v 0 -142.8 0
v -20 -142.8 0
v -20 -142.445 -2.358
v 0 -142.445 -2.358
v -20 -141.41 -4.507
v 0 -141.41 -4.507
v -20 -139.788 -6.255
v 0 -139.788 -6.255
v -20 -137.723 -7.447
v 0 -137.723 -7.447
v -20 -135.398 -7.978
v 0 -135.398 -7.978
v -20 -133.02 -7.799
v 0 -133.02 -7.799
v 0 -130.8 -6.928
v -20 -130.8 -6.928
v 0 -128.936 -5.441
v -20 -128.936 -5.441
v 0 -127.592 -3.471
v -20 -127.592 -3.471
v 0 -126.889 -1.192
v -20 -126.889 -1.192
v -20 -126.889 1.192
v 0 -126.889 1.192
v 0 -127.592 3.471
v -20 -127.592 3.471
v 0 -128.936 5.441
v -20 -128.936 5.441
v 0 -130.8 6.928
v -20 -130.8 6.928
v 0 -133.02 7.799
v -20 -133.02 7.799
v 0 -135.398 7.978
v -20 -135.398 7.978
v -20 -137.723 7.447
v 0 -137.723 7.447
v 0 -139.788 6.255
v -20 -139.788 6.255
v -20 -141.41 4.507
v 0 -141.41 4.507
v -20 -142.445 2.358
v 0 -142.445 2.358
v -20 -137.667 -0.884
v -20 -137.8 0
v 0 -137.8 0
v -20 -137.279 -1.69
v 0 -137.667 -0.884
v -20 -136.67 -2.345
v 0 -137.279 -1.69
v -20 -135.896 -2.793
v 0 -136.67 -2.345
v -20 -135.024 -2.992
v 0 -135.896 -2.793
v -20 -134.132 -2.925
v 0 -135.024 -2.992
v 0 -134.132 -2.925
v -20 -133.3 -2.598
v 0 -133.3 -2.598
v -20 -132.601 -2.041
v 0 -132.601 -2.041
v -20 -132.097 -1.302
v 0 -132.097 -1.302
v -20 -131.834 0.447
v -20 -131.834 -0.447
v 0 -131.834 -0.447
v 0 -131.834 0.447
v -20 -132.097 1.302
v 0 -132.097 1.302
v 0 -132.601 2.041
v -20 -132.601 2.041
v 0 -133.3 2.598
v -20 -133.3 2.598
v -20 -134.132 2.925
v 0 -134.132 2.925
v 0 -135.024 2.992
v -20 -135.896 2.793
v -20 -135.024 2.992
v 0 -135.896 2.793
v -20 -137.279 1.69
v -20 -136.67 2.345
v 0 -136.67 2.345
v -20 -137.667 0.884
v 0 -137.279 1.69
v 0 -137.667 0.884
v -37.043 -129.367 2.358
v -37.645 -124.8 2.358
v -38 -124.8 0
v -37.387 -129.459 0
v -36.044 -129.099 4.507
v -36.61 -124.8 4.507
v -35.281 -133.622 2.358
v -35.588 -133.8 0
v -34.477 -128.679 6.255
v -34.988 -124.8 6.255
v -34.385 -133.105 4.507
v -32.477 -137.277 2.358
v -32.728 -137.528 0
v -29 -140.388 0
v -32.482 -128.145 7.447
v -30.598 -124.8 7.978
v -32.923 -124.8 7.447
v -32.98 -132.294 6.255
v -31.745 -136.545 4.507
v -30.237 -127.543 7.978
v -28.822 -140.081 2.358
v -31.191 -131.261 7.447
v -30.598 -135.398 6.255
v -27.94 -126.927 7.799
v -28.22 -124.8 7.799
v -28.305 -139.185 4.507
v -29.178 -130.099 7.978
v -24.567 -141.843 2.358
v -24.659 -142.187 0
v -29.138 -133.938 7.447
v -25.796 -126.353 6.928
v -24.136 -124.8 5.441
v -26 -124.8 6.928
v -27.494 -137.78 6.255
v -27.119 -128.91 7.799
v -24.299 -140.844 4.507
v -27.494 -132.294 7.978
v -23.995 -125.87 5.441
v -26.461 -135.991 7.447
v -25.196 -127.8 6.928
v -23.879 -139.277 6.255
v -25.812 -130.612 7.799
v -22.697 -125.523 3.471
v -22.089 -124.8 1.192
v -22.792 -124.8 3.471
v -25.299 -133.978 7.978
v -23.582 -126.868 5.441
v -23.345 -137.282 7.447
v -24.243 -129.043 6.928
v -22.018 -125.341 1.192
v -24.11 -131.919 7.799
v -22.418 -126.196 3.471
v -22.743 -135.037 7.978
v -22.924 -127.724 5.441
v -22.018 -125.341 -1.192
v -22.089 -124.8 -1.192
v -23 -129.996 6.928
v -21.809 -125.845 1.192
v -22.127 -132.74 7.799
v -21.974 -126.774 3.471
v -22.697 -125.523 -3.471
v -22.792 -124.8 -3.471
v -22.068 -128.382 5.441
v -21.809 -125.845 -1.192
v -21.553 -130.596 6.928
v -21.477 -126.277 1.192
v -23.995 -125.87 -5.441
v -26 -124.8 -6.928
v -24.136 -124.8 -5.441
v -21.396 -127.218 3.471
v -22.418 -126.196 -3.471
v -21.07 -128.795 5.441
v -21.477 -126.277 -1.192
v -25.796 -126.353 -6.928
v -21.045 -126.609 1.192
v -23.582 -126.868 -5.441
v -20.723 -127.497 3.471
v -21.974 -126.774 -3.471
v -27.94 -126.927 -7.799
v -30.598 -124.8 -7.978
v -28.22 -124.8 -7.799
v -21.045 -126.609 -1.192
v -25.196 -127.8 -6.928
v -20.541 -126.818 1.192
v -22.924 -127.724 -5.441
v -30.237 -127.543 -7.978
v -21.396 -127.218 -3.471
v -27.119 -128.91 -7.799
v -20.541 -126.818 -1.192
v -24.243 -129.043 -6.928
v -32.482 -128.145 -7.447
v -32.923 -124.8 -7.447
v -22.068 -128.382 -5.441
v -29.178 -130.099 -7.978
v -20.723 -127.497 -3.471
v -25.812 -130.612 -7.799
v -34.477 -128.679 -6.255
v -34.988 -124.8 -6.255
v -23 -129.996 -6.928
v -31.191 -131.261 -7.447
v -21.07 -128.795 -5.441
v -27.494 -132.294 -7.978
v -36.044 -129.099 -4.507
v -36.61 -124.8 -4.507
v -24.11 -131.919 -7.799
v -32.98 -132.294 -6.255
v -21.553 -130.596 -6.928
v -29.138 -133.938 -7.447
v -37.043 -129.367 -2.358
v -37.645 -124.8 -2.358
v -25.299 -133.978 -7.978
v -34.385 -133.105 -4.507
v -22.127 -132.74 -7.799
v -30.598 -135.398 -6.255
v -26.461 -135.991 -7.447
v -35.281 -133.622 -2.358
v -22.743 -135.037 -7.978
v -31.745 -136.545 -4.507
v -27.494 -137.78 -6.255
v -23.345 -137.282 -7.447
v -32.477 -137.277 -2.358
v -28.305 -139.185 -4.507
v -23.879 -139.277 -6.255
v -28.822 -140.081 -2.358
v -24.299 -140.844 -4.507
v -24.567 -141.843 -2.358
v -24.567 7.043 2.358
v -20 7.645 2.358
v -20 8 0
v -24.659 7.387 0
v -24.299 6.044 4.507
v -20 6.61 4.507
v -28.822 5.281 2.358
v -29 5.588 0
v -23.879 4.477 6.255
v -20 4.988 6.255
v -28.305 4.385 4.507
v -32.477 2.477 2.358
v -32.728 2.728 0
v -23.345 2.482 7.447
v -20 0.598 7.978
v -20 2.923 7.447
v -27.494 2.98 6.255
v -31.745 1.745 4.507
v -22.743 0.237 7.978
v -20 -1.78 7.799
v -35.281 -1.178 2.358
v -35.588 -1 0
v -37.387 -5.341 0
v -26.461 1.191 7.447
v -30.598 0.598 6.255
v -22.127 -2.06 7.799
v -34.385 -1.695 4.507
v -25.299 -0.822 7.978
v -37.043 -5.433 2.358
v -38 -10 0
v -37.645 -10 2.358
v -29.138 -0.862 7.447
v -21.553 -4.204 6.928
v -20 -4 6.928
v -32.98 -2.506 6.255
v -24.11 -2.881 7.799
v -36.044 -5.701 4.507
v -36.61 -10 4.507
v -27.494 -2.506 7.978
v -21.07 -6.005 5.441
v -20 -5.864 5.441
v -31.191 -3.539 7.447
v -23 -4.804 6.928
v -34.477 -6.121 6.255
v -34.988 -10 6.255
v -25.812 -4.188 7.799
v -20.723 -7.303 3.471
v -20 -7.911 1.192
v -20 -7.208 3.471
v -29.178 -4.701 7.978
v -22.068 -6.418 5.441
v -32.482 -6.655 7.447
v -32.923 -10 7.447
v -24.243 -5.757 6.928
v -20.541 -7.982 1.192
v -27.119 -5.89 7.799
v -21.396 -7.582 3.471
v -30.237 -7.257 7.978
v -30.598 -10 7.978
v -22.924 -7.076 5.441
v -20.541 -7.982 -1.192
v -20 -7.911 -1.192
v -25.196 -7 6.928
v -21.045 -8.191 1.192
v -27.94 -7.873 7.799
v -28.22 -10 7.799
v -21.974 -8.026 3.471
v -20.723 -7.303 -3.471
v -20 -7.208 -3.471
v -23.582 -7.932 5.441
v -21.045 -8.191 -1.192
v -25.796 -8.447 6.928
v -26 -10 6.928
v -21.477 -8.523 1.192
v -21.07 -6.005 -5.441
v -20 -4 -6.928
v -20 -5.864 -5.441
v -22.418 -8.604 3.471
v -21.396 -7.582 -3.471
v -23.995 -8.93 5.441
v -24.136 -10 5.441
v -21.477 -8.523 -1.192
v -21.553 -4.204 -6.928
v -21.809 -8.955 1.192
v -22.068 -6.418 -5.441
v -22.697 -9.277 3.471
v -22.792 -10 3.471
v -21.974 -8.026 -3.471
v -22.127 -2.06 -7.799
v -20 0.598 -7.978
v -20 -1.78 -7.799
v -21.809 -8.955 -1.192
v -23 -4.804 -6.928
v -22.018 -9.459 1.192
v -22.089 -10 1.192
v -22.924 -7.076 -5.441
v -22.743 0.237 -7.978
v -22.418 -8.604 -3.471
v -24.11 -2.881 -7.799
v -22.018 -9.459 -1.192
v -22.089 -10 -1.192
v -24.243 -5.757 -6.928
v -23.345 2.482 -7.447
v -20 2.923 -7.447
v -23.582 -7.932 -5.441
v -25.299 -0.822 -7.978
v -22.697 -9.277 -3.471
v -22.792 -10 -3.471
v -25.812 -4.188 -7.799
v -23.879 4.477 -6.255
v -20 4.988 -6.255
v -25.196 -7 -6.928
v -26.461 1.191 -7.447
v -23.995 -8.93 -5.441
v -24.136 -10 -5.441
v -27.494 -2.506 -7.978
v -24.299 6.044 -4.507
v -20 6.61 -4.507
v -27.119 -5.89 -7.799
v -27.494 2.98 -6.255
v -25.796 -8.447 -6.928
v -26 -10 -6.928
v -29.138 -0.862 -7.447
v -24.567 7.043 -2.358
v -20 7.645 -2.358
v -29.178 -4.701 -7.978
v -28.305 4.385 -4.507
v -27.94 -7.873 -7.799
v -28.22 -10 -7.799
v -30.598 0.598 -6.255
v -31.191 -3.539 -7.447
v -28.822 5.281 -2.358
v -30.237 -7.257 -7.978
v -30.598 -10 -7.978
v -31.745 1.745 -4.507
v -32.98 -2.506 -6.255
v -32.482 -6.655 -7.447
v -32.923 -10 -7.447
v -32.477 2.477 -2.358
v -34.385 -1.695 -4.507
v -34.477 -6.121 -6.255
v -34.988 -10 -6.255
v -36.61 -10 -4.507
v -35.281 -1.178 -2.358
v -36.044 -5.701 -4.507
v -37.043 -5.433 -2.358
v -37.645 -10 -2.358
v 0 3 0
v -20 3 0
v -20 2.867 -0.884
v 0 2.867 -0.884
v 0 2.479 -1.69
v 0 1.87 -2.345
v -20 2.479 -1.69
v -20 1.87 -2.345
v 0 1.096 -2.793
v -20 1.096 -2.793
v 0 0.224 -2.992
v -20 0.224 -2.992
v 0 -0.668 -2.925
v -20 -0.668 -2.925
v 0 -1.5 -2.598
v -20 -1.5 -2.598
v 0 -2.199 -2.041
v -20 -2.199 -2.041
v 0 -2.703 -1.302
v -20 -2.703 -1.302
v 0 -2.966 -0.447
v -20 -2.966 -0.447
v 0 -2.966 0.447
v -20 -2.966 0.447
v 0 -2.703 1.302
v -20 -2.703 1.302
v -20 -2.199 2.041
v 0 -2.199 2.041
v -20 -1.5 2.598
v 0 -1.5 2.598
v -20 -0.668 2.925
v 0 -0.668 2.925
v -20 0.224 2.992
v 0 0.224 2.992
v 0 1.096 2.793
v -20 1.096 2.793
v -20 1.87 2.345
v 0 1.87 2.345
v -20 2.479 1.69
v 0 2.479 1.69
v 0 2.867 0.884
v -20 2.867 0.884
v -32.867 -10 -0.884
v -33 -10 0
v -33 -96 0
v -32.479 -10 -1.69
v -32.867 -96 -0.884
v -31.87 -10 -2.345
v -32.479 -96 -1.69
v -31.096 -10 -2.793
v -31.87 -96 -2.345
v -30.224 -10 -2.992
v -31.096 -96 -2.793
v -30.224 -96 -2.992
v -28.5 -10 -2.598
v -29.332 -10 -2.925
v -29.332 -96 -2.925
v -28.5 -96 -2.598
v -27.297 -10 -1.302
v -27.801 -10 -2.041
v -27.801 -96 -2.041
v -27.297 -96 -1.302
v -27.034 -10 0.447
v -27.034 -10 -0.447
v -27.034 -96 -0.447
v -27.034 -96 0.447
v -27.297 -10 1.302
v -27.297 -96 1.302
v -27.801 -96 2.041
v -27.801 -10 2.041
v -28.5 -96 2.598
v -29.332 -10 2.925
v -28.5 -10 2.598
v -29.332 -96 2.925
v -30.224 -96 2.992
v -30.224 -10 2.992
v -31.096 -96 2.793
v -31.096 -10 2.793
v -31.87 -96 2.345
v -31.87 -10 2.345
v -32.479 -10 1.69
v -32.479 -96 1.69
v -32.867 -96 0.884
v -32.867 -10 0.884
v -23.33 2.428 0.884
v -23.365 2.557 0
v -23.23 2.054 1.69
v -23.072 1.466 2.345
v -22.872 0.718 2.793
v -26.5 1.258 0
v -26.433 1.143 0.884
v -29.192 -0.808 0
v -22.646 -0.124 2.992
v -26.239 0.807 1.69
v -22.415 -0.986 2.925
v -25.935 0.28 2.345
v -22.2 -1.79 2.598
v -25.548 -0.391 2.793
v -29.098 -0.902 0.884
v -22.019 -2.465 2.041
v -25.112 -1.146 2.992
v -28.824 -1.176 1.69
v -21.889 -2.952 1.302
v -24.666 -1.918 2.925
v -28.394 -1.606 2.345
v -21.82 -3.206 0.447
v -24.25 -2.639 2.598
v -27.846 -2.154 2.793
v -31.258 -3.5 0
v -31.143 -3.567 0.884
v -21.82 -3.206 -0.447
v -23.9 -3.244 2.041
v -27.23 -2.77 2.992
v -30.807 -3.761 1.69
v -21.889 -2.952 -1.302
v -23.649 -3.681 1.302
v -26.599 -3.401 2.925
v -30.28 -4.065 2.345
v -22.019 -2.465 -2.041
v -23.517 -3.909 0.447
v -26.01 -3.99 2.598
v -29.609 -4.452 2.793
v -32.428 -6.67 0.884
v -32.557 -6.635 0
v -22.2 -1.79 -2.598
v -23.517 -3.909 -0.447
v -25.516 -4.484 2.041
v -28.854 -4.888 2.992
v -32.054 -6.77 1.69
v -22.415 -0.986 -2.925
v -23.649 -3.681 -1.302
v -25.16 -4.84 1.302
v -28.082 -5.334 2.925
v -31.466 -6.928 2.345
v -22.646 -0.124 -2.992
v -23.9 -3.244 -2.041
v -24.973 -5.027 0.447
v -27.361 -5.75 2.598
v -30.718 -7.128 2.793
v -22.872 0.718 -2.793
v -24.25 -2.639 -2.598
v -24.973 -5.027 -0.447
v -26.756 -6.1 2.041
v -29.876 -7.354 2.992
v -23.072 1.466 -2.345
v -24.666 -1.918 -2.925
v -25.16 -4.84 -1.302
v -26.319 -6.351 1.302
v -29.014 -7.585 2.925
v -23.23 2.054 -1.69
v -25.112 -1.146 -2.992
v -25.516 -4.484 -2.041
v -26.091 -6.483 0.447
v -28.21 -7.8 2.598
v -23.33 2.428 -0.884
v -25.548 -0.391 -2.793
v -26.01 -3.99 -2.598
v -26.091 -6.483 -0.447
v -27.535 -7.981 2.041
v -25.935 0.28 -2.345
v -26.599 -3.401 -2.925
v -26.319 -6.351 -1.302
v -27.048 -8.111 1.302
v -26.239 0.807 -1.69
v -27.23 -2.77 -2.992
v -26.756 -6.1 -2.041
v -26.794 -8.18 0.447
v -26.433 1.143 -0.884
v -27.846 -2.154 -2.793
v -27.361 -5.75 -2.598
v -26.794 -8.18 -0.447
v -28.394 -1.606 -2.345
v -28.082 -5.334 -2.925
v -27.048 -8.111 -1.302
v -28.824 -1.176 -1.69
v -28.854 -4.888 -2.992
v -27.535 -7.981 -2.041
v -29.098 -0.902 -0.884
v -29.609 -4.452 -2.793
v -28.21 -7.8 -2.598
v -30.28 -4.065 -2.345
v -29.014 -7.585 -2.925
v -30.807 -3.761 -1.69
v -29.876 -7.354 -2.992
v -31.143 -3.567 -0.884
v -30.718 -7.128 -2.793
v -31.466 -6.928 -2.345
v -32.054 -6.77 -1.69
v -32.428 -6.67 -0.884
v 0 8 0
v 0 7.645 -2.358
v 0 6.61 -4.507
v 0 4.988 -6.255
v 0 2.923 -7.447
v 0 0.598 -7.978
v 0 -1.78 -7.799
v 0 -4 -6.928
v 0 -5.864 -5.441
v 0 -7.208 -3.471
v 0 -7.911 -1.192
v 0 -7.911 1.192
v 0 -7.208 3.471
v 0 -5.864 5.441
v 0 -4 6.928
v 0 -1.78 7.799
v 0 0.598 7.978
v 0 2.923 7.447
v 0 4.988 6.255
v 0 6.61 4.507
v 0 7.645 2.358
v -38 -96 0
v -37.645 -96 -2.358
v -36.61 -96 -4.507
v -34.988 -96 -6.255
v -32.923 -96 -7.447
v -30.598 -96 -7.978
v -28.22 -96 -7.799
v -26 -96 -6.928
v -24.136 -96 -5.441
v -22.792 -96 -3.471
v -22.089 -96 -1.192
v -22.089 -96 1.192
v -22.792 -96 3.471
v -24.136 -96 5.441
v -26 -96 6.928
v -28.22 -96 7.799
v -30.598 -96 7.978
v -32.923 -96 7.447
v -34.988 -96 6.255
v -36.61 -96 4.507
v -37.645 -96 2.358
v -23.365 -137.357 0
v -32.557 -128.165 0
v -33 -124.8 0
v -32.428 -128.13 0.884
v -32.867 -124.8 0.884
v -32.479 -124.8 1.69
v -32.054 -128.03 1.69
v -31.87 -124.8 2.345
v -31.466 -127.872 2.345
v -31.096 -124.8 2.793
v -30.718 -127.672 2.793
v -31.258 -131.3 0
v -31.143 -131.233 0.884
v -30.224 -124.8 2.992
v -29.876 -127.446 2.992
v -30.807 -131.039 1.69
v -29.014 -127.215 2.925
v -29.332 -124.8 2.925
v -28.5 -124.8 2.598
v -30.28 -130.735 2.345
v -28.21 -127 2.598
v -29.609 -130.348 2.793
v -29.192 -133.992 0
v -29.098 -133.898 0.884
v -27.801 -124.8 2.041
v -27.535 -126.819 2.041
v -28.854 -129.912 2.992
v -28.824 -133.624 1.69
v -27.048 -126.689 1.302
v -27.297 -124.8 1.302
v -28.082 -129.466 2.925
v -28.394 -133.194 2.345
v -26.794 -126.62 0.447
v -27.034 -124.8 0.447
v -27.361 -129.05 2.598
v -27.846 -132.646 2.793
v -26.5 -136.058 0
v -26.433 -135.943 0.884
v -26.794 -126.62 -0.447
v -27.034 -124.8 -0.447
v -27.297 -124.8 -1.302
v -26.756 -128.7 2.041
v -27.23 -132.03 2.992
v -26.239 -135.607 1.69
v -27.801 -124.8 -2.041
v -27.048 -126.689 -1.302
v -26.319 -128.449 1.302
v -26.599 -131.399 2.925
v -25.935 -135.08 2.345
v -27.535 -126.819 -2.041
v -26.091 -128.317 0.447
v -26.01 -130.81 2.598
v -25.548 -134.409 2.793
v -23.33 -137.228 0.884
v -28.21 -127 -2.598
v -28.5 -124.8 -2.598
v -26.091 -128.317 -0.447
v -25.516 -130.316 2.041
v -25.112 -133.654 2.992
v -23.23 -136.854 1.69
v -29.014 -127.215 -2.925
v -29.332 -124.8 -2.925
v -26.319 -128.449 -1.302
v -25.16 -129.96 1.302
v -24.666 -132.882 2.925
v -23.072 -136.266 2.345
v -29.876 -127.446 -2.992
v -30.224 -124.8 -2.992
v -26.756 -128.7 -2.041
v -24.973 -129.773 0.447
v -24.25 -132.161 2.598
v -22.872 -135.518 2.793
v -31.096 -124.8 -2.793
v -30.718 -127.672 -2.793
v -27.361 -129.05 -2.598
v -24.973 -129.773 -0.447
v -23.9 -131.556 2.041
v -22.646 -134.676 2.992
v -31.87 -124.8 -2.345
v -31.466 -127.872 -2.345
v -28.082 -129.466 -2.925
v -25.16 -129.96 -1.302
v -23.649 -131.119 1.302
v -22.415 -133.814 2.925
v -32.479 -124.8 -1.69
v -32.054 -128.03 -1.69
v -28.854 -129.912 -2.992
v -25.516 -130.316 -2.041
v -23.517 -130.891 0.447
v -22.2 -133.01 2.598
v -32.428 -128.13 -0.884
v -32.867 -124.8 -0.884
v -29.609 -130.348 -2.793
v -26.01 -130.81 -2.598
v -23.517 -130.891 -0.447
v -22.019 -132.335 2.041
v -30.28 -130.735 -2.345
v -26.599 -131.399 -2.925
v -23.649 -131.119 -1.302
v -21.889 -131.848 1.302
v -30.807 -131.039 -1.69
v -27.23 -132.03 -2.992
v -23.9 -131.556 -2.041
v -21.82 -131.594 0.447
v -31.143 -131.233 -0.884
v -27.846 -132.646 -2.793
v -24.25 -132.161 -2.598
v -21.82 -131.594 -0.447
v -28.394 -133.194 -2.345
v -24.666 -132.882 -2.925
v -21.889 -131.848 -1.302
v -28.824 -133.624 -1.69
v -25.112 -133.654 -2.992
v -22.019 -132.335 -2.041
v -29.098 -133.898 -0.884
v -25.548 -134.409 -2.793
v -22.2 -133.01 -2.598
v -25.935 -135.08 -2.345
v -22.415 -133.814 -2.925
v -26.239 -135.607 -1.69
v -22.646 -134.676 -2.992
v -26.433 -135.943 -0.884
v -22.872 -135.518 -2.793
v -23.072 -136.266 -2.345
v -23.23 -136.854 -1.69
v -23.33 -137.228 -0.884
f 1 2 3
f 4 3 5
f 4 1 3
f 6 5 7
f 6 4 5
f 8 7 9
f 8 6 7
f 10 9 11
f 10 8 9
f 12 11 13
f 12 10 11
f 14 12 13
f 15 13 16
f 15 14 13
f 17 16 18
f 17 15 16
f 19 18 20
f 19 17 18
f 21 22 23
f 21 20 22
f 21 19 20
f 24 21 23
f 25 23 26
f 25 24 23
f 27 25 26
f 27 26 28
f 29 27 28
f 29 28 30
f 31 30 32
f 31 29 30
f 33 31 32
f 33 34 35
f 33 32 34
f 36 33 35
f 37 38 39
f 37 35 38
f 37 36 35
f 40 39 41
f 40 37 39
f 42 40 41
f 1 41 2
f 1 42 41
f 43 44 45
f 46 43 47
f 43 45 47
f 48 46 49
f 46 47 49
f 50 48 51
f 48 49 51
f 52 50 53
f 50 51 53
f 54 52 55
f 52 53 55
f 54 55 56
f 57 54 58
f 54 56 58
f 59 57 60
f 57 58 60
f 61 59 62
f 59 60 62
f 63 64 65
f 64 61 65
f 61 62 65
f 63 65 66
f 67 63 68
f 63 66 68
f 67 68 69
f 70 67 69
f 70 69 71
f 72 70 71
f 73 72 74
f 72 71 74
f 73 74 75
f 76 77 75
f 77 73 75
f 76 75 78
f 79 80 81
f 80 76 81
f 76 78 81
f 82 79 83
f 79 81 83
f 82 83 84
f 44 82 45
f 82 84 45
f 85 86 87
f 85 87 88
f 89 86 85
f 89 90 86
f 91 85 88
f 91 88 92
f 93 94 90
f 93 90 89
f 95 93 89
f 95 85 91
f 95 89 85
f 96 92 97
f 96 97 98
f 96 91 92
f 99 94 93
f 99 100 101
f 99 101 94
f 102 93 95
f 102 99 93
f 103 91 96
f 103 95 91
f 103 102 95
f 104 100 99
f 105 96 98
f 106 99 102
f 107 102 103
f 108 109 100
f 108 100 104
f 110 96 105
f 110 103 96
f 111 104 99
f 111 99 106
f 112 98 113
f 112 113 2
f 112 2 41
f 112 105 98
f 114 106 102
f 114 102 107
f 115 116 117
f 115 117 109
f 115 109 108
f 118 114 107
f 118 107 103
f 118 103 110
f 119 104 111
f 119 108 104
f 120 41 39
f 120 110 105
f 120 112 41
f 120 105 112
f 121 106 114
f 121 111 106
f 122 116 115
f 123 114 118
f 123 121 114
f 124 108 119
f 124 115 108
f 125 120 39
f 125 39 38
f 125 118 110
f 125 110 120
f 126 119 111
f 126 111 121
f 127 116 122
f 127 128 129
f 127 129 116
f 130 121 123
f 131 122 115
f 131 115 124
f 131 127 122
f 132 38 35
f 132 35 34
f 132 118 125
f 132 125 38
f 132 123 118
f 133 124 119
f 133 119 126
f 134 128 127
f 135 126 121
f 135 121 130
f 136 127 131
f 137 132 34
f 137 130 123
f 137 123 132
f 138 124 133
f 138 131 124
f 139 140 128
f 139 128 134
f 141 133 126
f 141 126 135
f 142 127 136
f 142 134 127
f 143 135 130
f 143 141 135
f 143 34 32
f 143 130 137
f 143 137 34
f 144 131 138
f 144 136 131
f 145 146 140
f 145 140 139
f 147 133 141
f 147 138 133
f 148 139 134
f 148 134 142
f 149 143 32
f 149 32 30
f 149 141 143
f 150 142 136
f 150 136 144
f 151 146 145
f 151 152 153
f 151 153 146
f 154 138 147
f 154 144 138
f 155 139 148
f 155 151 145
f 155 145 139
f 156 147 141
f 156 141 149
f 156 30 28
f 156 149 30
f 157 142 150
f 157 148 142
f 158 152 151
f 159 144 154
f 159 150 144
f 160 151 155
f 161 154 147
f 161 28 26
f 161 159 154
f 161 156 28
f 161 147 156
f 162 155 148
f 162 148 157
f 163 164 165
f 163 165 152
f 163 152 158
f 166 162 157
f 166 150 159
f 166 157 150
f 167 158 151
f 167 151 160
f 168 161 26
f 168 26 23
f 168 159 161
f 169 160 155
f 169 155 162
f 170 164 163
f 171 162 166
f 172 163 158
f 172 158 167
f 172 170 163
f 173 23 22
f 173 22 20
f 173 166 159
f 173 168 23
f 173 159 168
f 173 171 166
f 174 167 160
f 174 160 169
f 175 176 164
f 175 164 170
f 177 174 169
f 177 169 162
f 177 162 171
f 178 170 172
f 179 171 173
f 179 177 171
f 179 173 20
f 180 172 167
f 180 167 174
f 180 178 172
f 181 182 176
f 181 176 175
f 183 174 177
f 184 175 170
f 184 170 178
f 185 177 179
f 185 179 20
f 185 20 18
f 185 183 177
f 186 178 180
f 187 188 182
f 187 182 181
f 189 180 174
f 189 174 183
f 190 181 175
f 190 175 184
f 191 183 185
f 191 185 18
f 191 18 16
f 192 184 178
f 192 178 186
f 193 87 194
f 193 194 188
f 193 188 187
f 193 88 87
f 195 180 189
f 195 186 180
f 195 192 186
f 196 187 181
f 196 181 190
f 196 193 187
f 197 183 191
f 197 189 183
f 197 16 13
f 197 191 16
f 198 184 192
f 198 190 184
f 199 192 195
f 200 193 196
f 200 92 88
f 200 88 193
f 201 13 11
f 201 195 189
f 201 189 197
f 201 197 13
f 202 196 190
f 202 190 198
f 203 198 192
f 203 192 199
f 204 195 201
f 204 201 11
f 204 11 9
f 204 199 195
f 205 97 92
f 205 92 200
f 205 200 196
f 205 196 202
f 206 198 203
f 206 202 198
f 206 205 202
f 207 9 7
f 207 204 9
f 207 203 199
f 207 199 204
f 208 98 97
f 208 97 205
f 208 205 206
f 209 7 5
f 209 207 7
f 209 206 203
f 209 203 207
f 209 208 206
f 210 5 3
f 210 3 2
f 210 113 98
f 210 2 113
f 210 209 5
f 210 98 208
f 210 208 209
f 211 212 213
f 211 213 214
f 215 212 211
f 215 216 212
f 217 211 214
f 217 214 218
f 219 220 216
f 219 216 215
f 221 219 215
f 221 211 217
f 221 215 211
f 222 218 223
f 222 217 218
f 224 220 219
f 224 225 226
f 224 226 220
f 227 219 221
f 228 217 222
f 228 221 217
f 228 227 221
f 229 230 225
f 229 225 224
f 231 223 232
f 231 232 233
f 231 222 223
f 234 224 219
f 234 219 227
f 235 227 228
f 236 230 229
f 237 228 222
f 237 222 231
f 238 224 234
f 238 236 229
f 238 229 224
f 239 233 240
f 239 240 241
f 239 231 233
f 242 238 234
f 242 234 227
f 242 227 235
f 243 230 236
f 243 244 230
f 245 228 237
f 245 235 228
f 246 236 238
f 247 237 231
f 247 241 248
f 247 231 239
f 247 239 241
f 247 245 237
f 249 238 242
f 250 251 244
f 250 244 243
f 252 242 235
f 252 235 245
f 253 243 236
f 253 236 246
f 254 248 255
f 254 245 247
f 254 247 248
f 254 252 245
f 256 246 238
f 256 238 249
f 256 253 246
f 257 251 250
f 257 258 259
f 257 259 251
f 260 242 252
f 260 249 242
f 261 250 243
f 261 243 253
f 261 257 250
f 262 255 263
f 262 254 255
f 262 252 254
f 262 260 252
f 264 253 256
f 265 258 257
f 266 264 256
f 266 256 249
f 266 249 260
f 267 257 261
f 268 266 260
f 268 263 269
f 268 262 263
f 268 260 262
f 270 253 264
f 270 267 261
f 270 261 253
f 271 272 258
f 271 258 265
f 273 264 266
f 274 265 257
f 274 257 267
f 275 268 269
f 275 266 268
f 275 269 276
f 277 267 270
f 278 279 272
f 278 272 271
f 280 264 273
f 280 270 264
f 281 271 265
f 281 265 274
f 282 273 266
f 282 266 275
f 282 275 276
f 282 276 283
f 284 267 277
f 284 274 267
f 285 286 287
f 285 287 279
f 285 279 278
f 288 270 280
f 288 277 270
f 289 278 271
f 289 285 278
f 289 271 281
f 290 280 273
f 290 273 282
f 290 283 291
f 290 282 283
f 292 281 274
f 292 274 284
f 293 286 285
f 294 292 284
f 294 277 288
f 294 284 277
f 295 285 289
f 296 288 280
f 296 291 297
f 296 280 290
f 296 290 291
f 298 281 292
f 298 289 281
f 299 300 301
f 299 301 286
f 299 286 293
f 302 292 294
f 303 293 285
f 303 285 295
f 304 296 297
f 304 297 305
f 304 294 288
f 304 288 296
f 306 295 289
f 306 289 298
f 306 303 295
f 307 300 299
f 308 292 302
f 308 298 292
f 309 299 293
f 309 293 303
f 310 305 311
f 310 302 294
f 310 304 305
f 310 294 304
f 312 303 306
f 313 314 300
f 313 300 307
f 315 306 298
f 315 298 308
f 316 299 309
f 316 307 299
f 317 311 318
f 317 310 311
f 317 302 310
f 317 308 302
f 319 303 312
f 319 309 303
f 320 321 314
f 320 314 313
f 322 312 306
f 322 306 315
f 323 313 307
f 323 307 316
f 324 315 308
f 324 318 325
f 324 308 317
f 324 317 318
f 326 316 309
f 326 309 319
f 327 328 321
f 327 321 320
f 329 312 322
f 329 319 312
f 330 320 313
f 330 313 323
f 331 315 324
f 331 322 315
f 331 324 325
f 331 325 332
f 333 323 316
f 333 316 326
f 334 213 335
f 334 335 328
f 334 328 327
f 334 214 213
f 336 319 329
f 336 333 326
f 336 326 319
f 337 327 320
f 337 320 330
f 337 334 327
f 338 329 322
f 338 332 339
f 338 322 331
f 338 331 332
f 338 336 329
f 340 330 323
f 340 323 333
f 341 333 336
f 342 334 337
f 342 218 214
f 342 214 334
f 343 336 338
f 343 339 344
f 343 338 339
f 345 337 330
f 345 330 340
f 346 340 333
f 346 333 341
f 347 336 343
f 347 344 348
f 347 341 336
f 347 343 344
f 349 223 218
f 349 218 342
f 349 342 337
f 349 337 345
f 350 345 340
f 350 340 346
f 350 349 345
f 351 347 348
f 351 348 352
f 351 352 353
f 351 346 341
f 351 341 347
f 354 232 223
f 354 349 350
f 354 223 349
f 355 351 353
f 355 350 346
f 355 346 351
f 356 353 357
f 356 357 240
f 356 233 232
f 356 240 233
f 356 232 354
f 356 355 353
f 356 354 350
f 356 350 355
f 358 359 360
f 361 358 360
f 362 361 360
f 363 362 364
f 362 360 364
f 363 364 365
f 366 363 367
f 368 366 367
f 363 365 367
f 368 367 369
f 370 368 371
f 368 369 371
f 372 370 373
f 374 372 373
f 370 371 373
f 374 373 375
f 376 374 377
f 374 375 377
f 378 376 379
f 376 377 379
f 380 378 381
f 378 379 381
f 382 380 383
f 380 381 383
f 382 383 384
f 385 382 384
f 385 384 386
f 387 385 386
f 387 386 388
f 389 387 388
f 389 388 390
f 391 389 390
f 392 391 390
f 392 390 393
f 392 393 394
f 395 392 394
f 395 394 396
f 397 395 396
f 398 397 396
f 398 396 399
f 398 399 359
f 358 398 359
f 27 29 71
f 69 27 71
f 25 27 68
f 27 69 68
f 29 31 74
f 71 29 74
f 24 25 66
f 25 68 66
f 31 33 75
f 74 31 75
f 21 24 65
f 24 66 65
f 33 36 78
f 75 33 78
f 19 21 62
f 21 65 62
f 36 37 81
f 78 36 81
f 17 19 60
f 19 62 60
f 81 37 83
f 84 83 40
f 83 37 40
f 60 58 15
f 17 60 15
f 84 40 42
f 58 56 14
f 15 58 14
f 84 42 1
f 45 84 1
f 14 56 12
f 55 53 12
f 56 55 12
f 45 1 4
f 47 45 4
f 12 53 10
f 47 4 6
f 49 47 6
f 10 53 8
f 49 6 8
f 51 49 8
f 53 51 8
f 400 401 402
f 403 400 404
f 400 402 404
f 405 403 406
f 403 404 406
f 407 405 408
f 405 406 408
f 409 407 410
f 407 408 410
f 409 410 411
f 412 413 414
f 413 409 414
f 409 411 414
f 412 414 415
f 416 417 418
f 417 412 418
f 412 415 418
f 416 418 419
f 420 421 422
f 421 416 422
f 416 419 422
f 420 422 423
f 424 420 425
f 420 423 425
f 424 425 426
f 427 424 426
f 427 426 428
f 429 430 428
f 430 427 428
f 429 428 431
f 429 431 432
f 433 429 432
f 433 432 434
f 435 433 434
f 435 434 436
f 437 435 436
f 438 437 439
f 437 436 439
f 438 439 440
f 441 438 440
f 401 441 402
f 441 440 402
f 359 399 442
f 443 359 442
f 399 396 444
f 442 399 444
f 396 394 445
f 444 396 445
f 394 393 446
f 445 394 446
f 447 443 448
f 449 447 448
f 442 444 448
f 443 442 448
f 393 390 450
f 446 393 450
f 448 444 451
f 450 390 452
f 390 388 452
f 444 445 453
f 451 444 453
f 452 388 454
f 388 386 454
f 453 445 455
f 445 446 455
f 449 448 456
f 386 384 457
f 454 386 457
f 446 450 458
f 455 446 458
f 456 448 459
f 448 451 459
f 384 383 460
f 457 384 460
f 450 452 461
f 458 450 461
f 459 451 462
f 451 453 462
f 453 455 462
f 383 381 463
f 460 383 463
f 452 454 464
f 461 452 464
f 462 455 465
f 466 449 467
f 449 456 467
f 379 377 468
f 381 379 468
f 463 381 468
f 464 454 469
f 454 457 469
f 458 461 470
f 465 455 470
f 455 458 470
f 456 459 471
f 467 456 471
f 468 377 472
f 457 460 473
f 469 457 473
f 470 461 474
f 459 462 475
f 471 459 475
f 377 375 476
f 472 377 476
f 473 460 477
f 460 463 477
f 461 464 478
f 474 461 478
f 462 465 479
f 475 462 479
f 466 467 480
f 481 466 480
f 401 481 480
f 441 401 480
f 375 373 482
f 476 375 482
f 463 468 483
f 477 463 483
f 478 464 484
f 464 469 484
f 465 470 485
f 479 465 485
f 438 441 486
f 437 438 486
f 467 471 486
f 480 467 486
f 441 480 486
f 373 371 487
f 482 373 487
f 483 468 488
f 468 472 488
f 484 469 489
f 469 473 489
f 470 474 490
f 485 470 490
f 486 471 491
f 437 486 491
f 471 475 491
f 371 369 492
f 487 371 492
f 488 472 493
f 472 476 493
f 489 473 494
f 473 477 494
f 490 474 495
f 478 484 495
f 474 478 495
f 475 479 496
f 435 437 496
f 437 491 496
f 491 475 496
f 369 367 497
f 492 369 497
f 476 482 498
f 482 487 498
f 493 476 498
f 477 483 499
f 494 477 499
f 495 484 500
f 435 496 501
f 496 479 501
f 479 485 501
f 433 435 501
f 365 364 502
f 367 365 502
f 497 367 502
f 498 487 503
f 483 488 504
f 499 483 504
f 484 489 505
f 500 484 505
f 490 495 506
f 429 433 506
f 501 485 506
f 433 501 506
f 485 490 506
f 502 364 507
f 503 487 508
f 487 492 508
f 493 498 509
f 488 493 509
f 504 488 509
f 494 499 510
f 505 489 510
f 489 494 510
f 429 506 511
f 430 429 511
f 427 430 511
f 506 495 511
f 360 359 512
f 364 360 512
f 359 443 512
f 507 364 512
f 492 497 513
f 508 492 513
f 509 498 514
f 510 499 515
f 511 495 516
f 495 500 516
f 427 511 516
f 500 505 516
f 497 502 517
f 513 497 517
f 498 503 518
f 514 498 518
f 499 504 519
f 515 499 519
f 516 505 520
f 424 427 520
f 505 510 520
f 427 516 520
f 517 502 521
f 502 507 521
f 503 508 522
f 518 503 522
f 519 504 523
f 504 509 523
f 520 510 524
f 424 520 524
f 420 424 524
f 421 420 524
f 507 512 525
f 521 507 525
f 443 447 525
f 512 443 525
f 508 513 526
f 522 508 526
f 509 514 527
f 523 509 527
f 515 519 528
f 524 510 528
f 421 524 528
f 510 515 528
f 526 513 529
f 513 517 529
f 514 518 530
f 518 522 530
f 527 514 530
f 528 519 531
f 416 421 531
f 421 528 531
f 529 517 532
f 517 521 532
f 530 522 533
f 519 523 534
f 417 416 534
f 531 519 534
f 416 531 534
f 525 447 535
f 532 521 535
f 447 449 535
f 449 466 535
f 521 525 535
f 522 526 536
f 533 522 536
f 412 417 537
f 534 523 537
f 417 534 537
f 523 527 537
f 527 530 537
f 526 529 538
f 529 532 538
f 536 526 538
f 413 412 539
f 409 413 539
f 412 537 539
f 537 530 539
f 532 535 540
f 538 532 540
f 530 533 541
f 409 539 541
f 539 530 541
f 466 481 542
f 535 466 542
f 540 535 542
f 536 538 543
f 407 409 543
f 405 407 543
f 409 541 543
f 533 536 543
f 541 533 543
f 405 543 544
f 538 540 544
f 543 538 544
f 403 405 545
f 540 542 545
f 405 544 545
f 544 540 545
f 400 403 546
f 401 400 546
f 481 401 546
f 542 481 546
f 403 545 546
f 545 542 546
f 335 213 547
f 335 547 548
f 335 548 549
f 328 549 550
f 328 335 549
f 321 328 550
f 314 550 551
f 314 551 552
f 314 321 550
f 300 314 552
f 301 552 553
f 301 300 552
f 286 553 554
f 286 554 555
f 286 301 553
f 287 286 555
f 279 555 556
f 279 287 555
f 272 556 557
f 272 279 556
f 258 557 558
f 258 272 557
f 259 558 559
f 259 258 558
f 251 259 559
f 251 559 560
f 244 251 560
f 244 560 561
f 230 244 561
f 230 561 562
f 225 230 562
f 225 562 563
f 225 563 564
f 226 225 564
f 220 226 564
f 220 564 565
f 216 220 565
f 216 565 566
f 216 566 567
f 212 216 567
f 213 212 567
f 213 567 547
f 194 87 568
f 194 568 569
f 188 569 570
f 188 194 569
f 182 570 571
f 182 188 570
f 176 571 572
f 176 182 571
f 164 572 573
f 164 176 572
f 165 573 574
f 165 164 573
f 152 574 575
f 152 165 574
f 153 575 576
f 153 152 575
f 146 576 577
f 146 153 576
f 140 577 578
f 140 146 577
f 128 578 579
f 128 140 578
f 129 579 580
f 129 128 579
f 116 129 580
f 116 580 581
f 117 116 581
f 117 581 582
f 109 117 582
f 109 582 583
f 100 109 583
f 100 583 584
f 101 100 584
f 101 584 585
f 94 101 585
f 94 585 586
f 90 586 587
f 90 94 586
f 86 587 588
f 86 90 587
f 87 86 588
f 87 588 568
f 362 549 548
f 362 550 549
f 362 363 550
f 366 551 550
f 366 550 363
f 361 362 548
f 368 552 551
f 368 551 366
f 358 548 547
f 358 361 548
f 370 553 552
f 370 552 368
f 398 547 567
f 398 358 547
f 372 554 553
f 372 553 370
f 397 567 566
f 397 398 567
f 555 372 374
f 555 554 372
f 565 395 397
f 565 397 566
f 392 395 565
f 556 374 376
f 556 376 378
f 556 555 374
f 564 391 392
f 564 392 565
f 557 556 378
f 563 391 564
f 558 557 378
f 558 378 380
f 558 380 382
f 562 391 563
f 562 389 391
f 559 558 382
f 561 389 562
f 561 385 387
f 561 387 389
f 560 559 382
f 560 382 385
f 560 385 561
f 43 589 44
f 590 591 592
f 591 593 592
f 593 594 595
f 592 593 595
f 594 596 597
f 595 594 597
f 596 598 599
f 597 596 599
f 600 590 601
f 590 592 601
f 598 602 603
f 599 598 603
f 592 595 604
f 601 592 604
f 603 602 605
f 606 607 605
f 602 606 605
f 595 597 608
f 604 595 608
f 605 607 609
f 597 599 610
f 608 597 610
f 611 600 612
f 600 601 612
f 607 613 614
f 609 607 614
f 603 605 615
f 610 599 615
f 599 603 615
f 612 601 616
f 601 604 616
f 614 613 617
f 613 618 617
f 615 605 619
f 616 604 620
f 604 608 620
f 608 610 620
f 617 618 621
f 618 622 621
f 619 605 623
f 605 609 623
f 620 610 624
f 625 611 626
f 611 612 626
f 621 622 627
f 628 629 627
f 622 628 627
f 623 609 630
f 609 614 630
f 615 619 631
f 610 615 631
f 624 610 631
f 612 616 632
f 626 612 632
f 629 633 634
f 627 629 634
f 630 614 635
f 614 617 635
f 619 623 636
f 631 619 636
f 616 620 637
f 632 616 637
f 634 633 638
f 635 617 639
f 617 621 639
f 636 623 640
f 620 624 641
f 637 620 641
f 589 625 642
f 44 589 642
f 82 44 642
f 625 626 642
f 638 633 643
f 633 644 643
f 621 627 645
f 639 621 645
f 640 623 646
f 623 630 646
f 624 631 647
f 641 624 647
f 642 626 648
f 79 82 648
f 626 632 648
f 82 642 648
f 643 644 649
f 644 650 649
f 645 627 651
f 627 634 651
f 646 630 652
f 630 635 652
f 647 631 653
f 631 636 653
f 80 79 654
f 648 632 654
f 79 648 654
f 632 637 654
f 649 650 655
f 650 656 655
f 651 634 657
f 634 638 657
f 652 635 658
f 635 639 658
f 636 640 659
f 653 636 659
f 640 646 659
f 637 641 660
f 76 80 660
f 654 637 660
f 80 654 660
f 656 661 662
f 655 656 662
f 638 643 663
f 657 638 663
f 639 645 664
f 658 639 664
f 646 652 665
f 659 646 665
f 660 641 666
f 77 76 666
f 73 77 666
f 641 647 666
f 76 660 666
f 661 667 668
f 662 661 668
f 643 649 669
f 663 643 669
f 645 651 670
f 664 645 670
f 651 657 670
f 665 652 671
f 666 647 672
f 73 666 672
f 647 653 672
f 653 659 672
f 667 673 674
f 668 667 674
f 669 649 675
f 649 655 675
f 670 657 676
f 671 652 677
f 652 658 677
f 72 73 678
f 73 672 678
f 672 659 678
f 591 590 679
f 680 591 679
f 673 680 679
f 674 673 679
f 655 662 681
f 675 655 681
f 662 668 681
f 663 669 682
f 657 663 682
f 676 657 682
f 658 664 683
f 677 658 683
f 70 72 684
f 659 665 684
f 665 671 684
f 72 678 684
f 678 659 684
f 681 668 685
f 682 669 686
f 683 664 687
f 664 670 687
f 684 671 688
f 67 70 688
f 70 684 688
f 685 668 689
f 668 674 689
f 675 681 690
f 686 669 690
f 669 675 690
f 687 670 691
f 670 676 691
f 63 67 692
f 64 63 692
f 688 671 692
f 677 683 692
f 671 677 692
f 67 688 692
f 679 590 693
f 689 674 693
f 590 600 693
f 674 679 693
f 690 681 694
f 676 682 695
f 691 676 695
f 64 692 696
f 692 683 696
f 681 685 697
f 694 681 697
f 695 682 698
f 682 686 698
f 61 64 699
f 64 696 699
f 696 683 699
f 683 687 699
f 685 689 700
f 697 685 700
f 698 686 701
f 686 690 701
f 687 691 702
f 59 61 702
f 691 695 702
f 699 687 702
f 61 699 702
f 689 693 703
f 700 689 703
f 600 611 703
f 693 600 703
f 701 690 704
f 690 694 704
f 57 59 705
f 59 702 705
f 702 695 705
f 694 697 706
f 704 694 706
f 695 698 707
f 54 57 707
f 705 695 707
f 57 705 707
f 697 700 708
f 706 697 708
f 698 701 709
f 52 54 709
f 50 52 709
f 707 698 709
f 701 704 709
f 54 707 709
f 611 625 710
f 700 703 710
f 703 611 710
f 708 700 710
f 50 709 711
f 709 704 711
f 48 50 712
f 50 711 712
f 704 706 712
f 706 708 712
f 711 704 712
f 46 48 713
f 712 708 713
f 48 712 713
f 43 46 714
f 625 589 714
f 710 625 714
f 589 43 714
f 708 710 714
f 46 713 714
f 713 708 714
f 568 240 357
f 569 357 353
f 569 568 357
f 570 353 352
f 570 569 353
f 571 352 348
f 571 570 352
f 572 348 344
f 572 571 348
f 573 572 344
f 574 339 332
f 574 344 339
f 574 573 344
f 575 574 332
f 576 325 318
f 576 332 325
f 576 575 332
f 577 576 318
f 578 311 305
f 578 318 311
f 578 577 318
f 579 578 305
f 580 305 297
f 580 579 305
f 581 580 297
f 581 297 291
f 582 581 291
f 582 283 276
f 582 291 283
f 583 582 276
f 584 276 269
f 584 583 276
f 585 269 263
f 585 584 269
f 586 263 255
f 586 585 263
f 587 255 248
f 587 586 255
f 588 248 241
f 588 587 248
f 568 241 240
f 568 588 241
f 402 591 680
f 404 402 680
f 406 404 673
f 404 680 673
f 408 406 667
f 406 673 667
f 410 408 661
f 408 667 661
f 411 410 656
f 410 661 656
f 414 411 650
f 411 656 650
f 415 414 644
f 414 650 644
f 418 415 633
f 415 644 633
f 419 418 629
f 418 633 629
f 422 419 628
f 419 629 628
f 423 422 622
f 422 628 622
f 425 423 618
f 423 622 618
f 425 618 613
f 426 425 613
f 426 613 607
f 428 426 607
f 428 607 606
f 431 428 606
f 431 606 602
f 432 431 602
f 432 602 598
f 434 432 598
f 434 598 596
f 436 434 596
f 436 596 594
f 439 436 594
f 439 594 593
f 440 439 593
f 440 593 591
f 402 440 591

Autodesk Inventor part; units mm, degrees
ref_plane "YZ Plane" through (0, 0, 0) normal (1, 0, 0) x (0, 1, 0)
ref_plane "XZ Plane" through (0, 0, 0) normal (0, 1, 0) x (-1, 0, 0)
ref_plane "XY Plane" through (0, 0, 0) normal (0, 0, 1) x (1, 0, 0)
sketch "Sketch3" plane through (0, 0, 0) normal (1, 0, 0) x (0, 1, 0)
  circle A0 centre (0, 0) radius 8
  circle A1 centre (0, 0) radius 3
  dimension "d4" = 16
  dimension "d5" = 6
sketch "Sketch4" plane through (0, 0, 0) normal (0, 0, 1) x (1, 0, 0)
  line L0 (0, 0) -> (-20, 0)
  line L1 (-30, -10) -> (-30, -96)
  arc A0 (-20, 0) -> (-30, -10) centre (-20, -10) ccw
  line L2 (0, -134.8) -> (-20, -134.8)
  line L3 (-20, -134.8) -> (-20, -134.8)
  line L4 (-30, -124.8) -> (-30, -96)
  arc A1 (-30, -124.8) -> (-20, -134.8) centre (-20, -124.8) ccw
  point P0 (-30, -106)
  point P1 (-30, -134.8)
sweep "Sweep2" add profiles "Sketch3" path "Sketch4"
equation "\"BendRadius\" = Thickness"
equation "\"BendReliefWidth\" = Thickness"
equation "\"BendReliefDepth\" = 0.5 * Thickness"
equation "\"CornerReliefSize\" = 4 * Thickness"
equation "\"MinimumRemnant\" = 2 * Thickness"
equation "\"TransitionRadius\" = BendRadius"
equation "\"JacobiRadiusSize\" = BendRadius"
equation "\"GapSize\" = Thickness"
equation "\"Thickness\" = 0.5"
properties part number "Rubber pipe turn"
